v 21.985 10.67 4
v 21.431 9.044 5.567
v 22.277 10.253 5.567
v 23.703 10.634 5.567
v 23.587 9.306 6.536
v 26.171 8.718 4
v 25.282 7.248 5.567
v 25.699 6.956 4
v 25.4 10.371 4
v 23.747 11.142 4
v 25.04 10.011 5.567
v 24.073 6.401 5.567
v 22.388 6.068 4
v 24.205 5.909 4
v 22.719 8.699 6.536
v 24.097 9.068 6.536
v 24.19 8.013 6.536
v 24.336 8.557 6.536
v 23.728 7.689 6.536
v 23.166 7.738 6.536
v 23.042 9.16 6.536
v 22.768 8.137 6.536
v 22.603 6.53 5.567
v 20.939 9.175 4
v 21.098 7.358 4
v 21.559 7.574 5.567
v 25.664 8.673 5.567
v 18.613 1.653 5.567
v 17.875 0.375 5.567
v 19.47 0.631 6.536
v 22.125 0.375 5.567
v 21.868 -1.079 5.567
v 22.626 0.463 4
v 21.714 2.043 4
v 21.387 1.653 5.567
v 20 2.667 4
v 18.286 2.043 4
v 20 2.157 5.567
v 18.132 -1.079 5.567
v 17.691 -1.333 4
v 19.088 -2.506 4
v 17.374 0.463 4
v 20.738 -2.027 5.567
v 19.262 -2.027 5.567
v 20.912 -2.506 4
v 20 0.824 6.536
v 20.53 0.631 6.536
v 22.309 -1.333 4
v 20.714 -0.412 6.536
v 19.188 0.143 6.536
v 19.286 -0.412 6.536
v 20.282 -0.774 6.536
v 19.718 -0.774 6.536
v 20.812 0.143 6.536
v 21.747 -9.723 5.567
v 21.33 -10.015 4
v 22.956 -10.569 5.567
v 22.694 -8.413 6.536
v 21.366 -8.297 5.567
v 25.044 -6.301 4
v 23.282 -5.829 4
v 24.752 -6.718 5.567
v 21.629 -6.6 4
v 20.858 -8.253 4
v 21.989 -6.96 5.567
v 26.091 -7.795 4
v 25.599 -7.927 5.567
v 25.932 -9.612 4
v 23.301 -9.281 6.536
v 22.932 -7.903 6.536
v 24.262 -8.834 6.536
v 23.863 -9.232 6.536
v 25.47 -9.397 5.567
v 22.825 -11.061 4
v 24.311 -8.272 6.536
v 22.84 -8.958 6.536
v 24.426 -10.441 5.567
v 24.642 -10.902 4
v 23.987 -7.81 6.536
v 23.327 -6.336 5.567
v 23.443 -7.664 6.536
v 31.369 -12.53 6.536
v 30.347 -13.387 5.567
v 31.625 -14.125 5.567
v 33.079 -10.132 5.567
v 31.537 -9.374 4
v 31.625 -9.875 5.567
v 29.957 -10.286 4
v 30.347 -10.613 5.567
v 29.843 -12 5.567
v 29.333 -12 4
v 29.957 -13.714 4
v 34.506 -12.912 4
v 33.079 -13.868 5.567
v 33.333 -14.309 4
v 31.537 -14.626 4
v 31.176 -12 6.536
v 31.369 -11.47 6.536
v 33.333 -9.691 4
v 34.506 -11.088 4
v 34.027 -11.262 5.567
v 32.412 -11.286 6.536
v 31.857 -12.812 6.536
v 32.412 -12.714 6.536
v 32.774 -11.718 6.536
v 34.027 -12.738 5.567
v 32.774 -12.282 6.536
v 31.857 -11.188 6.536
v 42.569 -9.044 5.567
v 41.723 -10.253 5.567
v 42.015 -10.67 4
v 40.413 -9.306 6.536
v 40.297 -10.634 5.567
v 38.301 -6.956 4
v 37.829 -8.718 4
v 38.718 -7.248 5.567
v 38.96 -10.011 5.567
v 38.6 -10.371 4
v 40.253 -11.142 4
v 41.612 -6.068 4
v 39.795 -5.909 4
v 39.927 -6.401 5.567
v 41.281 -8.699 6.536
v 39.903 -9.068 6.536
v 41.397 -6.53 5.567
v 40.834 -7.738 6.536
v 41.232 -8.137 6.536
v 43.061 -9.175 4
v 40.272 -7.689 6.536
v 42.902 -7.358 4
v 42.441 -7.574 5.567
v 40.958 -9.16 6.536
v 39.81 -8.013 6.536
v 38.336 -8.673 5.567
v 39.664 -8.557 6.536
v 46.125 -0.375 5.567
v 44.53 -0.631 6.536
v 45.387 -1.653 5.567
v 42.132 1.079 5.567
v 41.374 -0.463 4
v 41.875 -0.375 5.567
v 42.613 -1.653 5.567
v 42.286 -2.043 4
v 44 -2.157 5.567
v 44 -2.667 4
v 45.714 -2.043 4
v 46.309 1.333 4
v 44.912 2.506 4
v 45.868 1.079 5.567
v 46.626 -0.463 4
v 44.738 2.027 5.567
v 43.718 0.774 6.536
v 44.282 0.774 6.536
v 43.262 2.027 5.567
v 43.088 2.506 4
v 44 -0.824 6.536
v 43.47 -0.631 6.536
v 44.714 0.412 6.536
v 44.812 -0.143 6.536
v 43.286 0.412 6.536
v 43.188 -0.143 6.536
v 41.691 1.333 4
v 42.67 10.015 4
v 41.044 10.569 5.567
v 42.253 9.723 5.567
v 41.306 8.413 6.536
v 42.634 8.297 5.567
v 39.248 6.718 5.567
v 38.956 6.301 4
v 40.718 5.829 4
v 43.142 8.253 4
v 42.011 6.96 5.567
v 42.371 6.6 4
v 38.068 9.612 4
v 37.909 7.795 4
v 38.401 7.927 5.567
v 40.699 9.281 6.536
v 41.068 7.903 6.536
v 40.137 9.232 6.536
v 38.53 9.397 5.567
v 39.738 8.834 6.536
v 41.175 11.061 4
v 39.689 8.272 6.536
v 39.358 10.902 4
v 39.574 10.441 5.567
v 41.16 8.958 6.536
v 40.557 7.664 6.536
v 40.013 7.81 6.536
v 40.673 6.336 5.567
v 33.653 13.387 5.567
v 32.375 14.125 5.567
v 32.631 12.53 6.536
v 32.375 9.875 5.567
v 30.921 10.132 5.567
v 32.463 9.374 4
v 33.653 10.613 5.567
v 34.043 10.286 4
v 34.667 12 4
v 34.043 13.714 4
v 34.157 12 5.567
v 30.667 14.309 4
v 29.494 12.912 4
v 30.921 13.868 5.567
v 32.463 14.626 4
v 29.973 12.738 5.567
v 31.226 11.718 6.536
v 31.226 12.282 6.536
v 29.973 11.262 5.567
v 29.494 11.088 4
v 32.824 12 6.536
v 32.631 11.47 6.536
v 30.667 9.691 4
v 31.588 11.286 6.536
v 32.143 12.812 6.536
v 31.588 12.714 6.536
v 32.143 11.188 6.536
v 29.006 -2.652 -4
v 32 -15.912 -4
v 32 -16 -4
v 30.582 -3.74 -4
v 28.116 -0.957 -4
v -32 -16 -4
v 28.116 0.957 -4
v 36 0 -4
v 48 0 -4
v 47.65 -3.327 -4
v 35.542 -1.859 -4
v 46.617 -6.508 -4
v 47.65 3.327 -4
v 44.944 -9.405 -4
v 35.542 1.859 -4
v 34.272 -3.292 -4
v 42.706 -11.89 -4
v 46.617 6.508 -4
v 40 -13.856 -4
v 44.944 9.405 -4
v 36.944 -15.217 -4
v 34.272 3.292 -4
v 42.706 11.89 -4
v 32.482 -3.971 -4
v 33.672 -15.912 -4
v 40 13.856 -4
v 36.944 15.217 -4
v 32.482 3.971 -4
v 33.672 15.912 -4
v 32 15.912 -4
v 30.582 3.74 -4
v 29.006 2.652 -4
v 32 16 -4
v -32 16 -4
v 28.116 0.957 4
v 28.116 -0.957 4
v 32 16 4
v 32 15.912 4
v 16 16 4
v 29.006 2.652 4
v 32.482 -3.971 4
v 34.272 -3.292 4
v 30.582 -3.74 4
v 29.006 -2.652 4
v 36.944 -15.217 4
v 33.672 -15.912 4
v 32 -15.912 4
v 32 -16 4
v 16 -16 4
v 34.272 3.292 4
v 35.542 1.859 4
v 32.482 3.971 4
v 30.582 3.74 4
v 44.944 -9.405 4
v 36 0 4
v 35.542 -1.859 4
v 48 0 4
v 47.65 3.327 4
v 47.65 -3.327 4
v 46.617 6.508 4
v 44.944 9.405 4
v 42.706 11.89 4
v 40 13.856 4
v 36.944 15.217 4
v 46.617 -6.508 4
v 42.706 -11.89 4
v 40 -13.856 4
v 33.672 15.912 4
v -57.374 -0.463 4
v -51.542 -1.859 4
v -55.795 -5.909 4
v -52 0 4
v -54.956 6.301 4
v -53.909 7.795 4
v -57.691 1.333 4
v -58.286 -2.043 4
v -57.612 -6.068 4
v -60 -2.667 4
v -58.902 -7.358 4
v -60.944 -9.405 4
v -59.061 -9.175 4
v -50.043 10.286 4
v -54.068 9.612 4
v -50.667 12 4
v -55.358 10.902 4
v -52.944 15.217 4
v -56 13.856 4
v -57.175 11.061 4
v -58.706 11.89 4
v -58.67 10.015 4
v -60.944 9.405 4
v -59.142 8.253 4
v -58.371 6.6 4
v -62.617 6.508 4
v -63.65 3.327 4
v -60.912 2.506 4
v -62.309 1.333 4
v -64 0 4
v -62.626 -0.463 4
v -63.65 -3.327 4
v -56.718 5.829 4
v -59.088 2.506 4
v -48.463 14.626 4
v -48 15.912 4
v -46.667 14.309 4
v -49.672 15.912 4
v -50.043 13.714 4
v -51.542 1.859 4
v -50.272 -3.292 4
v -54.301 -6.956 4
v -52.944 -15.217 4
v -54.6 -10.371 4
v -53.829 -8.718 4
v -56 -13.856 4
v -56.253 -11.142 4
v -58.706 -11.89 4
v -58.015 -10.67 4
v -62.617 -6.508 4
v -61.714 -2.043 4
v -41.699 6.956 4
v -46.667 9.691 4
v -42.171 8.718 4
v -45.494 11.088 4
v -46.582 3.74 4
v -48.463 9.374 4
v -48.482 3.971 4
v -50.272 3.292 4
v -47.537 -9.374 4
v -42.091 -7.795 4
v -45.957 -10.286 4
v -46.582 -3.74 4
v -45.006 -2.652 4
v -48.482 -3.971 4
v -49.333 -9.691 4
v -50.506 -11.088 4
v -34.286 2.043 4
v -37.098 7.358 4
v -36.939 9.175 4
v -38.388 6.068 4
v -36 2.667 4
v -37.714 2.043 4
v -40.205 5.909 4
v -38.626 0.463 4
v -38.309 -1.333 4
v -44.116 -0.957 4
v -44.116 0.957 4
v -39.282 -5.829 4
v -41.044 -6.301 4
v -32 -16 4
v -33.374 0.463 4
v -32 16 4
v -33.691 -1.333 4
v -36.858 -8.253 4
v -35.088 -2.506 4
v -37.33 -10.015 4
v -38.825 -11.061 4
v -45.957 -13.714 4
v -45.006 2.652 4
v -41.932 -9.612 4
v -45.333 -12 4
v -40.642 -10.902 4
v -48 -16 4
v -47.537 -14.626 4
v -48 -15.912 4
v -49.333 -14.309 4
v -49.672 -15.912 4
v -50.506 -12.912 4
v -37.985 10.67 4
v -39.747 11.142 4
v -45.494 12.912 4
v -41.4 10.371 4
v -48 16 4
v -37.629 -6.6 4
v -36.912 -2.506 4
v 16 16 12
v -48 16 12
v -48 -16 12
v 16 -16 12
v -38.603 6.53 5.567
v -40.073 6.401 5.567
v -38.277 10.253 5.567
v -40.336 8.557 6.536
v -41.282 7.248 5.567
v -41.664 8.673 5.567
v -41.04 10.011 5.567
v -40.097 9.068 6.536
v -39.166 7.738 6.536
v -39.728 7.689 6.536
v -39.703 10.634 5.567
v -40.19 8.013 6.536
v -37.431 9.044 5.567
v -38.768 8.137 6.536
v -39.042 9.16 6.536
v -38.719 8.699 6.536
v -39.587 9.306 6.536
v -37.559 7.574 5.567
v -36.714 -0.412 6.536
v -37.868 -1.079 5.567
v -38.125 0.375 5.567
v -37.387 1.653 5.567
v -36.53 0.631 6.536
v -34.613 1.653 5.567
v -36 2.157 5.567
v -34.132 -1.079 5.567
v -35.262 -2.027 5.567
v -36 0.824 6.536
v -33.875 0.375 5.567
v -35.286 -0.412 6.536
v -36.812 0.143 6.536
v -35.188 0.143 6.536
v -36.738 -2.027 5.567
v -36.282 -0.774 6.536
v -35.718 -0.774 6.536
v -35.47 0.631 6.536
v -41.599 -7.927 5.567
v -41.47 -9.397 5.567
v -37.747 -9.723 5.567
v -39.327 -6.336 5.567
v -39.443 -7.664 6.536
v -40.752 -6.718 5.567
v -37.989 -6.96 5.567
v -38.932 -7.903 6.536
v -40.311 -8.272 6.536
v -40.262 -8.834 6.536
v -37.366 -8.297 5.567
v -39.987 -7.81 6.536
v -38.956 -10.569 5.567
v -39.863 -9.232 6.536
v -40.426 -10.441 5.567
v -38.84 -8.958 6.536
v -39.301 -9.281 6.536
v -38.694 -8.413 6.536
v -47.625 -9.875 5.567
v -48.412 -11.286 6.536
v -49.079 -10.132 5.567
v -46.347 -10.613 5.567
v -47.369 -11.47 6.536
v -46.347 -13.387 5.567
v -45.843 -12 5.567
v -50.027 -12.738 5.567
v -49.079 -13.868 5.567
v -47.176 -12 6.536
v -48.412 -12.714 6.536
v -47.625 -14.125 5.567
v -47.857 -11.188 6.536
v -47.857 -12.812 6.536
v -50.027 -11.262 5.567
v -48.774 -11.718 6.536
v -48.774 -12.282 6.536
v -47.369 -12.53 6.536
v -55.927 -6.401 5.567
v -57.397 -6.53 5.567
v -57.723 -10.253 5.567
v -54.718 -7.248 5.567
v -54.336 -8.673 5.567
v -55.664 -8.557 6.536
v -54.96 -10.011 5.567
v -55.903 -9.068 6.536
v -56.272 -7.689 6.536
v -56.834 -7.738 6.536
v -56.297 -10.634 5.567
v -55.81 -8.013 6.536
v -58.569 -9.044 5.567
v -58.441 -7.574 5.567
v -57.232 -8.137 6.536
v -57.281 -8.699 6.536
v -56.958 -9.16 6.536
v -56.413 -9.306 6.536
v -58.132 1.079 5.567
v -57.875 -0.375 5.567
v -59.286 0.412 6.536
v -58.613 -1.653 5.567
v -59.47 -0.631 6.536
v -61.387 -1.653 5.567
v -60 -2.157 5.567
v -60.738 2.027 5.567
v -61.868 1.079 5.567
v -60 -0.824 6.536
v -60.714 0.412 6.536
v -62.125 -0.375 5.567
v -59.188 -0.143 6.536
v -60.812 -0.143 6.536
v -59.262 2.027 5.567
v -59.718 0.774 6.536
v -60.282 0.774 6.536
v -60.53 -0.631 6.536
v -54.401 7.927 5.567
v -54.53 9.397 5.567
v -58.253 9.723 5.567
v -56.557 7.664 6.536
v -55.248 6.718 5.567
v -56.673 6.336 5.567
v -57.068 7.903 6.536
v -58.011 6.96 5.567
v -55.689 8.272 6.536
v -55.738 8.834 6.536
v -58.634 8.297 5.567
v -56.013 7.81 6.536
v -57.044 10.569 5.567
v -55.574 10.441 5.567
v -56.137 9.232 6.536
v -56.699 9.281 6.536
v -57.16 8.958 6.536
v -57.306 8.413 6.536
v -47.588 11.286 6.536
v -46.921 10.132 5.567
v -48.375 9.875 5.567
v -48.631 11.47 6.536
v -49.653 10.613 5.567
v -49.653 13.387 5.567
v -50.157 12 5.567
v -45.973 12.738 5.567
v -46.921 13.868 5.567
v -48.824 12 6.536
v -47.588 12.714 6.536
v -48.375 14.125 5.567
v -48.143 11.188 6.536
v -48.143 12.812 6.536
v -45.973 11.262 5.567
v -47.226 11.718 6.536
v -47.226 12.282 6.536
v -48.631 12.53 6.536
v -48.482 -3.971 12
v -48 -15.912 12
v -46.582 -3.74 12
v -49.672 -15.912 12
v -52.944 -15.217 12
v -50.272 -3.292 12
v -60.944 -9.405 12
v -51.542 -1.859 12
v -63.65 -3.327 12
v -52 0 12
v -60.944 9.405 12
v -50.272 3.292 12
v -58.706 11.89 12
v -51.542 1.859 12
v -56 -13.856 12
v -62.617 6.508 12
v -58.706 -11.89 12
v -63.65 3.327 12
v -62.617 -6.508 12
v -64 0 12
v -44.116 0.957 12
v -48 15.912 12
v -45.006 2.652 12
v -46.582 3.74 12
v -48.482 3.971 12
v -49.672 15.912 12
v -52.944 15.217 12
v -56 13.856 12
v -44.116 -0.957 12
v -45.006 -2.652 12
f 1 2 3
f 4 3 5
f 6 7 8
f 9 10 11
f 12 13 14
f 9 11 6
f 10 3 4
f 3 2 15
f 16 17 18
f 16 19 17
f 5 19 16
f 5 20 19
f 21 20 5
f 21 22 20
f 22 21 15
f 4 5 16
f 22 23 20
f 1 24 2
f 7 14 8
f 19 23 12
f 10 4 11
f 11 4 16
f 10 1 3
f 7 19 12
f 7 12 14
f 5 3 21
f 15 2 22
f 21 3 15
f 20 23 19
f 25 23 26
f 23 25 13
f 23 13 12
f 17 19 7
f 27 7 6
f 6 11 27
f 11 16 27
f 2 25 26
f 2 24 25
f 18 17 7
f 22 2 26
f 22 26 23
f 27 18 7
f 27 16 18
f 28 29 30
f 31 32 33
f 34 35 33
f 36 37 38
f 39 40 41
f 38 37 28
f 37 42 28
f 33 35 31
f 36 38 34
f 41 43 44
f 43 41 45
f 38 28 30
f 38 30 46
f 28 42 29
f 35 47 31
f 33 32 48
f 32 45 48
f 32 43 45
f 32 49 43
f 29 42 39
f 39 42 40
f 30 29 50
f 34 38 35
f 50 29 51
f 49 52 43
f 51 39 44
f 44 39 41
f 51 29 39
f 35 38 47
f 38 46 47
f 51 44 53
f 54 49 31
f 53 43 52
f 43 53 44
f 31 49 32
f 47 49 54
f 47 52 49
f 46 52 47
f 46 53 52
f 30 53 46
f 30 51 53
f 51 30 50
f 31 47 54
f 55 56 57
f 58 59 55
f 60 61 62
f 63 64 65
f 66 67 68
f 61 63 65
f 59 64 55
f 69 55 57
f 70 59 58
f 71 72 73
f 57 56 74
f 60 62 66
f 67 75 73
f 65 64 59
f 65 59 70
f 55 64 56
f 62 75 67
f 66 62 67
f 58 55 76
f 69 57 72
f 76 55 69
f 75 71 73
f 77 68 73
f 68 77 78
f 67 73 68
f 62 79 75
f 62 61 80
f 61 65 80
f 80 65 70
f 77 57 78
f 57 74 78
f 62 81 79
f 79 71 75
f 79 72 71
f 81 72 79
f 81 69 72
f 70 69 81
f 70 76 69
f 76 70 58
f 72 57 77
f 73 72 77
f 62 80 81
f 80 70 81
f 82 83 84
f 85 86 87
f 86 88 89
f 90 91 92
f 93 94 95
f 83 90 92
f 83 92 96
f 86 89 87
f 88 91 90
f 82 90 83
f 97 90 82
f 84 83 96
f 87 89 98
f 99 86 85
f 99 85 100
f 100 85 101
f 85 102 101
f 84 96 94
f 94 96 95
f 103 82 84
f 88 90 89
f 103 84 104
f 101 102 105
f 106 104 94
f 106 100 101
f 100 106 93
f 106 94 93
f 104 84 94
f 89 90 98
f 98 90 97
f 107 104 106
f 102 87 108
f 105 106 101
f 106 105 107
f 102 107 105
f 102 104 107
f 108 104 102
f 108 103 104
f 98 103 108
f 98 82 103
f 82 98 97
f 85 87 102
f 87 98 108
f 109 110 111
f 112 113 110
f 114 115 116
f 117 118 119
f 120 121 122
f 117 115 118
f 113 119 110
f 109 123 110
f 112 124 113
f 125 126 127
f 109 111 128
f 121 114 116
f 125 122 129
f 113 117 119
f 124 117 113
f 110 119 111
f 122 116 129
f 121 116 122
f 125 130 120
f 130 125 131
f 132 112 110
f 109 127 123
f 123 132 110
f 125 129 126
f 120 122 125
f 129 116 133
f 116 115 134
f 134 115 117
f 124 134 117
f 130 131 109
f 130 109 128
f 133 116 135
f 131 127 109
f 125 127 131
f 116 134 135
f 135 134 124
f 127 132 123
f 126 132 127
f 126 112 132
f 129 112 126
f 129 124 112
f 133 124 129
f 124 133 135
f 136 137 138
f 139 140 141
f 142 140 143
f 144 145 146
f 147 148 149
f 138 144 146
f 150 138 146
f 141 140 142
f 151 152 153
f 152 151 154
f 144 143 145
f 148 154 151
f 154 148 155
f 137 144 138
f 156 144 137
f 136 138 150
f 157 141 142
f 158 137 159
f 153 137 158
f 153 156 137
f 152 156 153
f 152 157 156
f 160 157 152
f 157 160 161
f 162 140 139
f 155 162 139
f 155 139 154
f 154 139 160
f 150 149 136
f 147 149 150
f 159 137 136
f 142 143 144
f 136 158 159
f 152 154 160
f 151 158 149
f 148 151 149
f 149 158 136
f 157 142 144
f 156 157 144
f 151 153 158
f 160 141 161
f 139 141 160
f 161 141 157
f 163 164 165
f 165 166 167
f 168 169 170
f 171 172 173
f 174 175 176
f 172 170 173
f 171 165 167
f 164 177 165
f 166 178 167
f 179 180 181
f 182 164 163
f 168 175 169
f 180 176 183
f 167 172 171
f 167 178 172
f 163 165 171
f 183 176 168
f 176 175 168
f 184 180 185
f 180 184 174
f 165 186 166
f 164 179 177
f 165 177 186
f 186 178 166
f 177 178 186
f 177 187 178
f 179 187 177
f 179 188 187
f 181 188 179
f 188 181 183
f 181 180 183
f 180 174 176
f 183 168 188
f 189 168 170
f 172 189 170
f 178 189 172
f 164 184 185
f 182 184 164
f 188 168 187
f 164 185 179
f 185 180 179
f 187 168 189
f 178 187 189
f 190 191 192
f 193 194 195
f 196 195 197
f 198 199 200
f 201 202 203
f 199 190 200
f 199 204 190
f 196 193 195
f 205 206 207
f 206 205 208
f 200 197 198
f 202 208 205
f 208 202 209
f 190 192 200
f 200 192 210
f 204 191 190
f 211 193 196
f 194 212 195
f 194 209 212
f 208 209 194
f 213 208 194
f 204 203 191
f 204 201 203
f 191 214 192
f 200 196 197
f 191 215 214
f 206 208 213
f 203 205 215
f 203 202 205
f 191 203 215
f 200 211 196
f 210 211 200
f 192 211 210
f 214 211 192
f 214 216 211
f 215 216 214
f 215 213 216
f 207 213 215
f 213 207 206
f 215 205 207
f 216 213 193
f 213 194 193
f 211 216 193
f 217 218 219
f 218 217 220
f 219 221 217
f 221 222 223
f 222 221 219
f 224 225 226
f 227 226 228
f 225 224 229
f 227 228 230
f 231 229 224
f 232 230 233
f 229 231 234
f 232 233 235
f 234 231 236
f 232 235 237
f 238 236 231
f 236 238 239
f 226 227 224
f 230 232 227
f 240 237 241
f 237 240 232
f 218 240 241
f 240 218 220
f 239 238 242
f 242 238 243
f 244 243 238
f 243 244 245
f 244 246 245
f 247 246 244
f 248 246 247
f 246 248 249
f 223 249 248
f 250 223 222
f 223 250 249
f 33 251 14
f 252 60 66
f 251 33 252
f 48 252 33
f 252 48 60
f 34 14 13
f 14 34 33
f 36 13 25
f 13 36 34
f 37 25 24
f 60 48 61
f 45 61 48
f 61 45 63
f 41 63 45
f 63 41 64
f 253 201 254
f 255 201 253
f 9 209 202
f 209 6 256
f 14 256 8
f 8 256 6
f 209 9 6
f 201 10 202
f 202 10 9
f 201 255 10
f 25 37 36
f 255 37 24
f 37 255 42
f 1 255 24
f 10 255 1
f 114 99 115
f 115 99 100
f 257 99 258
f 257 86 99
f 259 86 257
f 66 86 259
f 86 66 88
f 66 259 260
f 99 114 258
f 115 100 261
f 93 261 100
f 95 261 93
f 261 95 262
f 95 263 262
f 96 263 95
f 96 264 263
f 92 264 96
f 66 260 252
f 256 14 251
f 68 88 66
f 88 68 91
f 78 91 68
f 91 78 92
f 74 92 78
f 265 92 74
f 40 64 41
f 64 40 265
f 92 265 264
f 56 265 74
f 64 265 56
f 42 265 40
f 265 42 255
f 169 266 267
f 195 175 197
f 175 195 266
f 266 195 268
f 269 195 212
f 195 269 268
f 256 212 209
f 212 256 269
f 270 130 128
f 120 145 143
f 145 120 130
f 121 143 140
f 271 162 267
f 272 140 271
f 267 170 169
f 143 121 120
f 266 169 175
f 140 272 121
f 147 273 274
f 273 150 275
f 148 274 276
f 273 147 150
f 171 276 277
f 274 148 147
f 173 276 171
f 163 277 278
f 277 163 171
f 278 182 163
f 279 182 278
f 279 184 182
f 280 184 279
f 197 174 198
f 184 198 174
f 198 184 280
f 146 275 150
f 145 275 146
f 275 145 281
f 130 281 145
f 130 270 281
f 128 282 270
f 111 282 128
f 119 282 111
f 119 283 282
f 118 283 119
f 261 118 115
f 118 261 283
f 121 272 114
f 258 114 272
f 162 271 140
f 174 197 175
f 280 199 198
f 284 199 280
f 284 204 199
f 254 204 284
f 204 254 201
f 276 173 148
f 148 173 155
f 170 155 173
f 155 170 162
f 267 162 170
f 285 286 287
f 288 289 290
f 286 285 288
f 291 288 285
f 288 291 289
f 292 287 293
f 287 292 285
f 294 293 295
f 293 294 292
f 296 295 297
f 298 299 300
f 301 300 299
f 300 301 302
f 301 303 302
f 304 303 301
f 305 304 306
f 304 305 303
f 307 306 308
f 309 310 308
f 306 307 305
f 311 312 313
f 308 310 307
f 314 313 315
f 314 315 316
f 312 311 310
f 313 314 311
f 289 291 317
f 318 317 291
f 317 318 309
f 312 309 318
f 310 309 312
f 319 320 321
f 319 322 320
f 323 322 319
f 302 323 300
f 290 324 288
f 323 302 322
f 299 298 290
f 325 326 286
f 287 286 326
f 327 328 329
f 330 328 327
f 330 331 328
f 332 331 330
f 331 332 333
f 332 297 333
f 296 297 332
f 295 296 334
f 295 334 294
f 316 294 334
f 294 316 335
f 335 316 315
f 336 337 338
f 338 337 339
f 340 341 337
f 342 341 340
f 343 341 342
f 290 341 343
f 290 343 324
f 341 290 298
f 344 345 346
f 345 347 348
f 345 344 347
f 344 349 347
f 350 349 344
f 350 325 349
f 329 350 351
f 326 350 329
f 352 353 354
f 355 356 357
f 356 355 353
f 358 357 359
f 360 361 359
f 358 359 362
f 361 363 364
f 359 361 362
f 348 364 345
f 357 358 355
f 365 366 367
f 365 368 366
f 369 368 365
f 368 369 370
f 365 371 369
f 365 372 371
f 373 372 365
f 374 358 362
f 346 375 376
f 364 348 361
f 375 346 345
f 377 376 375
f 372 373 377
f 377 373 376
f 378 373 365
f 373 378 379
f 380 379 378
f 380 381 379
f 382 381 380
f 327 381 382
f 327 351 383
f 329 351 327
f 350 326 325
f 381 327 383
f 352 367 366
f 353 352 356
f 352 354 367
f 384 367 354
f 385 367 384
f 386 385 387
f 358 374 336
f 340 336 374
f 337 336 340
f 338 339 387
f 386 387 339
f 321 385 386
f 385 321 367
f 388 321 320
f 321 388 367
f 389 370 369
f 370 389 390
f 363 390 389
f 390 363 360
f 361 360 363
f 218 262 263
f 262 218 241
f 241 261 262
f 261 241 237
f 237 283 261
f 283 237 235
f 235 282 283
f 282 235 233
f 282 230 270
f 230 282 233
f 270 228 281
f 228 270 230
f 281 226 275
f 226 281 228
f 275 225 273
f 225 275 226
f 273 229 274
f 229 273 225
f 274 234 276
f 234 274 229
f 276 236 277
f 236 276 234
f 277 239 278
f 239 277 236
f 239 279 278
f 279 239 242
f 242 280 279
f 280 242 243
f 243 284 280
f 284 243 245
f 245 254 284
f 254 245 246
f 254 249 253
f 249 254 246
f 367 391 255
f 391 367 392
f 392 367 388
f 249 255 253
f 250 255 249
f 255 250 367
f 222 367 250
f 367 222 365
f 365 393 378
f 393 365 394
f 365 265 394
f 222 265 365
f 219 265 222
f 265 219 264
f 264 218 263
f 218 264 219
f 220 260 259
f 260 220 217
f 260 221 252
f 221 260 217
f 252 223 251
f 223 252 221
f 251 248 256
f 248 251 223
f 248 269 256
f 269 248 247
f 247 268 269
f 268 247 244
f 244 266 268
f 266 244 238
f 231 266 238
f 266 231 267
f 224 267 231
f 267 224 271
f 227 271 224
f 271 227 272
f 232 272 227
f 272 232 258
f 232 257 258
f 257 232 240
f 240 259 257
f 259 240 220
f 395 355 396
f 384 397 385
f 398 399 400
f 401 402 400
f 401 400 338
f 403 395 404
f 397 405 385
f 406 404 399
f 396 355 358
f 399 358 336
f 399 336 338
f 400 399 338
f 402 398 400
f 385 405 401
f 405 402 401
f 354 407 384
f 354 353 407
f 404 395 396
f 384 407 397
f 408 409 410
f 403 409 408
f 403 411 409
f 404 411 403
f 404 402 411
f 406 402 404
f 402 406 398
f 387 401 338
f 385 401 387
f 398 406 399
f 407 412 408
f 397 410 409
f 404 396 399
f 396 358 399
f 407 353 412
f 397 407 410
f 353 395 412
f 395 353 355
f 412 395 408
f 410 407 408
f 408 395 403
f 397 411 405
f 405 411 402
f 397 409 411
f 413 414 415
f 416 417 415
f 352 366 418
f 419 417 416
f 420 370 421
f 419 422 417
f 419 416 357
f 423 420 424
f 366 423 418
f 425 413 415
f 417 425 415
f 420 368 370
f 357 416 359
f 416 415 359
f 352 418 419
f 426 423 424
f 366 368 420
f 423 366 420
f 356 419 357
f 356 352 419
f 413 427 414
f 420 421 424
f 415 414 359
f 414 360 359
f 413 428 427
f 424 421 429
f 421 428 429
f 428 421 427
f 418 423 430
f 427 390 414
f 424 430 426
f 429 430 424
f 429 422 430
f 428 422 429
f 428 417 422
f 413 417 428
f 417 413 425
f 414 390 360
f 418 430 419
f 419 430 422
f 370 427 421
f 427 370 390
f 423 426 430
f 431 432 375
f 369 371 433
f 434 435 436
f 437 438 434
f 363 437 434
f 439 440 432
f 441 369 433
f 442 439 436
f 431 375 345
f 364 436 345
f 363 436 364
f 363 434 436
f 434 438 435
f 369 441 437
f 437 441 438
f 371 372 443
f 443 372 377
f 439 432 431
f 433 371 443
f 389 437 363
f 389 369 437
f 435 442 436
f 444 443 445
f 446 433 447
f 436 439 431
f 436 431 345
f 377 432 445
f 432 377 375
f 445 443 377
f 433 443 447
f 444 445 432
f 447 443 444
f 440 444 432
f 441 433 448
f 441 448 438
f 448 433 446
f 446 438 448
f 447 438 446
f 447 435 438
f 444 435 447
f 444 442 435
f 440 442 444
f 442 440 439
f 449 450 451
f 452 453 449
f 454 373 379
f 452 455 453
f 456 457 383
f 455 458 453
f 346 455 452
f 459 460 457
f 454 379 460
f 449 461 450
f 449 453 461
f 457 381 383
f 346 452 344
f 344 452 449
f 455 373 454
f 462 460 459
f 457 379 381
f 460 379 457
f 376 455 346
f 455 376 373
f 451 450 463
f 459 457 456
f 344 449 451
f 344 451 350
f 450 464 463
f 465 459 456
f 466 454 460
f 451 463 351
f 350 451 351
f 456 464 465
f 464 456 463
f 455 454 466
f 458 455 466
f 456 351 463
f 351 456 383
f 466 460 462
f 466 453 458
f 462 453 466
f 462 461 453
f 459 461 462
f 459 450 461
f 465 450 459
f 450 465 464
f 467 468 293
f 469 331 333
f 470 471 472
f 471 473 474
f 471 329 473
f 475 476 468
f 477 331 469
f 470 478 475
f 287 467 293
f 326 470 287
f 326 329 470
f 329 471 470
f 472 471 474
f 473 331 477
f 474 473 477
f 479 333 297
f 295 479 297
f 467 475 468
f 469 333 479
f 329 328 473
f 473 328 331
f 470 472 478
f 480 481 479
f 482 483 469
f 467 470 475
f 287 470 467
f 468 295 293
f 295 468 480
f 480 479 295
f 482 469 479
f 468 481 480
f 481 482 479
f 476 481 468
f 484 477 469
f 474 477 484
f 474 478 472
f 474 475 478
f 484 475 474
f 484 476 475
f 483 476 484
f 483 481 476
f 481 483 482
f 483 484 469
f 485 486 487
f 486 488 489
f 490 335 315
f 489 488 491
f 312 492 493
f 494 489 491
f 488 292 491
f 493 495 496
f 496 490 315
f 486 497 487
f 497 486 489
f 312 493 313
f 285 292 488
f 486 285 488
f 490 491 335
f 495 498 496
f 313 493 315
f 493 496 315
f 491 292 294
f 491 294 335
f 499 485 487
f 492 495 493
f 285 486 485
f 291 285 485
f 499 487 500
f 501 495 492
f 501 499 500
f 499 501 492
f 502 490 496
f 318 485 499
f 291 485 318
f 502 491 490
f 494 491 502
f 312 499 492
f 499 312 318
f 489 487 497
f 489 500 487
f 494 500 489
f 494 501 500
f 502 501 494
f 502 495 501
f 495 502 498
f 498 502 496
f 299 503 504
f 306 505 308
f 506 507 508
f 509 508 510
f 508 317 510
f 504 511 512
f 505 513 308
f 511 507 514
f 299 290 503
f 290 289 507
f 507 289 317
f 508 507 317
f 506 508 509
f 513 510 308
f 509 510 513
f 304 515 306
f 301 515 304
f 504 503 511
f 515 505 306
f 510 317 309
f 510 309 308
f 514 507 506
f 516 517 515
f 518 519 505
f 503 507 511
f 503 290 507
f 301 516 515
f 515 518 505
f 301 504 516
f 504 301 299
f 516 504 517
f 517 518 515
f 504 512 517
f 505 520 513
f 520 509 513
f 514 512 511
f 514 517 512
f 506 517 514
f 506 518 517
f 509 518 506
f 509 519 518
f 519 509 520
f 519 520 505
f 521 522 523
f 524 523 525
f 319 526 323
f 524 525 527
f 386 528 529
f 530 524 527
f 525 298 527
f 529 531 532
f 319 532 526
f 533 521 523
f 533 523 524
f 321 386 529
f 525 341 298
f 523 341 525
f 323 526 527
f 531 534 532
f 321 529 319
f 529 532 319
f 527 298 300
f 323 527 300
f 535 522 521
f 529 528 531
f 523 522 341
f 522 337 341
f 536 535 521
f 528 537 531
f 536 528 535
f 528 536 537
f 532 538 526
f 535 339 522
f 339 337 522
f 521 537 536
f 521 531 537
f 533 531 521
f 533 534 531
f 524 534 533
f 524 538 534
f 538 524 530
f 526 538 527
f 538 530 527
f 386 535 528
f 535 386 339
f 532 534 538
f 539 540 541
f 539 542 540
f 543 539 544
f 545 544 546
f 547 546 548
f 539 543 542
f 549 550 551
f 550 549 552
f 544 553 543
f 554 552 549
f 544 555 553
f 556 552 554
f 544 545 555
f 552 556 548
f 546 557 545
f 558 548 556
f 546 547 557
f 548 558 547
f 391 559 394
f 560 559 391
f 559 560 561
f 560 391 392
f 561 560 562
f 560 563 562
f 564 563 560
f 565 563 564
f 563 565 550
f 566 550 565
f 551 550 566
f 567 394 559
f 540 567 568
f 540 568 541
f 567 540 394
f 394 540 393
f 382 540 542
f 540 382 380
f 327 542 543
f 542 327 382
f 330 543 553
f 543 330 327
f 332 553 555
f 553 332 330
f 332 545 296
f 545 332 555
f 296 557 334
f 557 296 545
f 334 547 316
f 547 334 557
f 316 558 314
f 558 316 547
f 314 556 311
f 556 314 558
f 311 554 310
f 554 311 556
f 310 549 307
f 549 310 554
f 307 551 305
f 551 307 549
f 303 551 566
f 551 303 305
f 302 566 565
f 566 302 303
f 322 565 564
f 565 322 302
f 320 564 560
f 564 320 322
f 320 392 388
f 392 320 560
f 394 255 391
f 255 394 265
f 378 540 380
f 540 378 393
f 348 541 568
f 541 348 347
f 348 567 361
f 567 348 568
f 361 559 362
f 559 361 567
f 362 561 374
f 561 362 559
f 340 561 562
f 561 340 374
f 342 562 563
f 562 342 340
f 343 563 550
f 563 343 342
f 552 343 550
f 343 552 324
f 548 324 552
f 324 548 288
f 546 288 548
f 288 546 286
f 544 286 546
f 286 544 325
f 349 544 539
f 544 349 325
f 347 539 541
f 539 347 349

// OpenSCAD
// Sticking to multiples of 8
units = 16;
length = 64;
width = 32;

top();
translate([-units, 0, units/2]) rotate([0, 180, 0]) bottom();


module top() {
  entire();
  divots(8);
}

module bottom() {
  difference() {
    entire();
    divots(8);
  }
}

module entire(l = length) {
  difference() {
    linear_extrude(height=units/2, center=true) {
      difference() {
        bar(l);
        translate([l/2, 0]) hole();
      }
    }
  }
}

module bar(l = length) {
  square(size=[l, width], center=true);
  translate([l/2, 0, 0]) circle(r=units);
}

module hole() {
  circle(r=units/4, center=true);
}

module divots(num = 4, offset = length) {
  deg = 360 / num;
  translate([offset/2, 0, units/4]) {
    for (i=[1:num]) {
      rotate([0, 0, i * deg]) {
        translate([0, units*.75, 0]) sphere(r=units/6);
      }
    }
  }
}
